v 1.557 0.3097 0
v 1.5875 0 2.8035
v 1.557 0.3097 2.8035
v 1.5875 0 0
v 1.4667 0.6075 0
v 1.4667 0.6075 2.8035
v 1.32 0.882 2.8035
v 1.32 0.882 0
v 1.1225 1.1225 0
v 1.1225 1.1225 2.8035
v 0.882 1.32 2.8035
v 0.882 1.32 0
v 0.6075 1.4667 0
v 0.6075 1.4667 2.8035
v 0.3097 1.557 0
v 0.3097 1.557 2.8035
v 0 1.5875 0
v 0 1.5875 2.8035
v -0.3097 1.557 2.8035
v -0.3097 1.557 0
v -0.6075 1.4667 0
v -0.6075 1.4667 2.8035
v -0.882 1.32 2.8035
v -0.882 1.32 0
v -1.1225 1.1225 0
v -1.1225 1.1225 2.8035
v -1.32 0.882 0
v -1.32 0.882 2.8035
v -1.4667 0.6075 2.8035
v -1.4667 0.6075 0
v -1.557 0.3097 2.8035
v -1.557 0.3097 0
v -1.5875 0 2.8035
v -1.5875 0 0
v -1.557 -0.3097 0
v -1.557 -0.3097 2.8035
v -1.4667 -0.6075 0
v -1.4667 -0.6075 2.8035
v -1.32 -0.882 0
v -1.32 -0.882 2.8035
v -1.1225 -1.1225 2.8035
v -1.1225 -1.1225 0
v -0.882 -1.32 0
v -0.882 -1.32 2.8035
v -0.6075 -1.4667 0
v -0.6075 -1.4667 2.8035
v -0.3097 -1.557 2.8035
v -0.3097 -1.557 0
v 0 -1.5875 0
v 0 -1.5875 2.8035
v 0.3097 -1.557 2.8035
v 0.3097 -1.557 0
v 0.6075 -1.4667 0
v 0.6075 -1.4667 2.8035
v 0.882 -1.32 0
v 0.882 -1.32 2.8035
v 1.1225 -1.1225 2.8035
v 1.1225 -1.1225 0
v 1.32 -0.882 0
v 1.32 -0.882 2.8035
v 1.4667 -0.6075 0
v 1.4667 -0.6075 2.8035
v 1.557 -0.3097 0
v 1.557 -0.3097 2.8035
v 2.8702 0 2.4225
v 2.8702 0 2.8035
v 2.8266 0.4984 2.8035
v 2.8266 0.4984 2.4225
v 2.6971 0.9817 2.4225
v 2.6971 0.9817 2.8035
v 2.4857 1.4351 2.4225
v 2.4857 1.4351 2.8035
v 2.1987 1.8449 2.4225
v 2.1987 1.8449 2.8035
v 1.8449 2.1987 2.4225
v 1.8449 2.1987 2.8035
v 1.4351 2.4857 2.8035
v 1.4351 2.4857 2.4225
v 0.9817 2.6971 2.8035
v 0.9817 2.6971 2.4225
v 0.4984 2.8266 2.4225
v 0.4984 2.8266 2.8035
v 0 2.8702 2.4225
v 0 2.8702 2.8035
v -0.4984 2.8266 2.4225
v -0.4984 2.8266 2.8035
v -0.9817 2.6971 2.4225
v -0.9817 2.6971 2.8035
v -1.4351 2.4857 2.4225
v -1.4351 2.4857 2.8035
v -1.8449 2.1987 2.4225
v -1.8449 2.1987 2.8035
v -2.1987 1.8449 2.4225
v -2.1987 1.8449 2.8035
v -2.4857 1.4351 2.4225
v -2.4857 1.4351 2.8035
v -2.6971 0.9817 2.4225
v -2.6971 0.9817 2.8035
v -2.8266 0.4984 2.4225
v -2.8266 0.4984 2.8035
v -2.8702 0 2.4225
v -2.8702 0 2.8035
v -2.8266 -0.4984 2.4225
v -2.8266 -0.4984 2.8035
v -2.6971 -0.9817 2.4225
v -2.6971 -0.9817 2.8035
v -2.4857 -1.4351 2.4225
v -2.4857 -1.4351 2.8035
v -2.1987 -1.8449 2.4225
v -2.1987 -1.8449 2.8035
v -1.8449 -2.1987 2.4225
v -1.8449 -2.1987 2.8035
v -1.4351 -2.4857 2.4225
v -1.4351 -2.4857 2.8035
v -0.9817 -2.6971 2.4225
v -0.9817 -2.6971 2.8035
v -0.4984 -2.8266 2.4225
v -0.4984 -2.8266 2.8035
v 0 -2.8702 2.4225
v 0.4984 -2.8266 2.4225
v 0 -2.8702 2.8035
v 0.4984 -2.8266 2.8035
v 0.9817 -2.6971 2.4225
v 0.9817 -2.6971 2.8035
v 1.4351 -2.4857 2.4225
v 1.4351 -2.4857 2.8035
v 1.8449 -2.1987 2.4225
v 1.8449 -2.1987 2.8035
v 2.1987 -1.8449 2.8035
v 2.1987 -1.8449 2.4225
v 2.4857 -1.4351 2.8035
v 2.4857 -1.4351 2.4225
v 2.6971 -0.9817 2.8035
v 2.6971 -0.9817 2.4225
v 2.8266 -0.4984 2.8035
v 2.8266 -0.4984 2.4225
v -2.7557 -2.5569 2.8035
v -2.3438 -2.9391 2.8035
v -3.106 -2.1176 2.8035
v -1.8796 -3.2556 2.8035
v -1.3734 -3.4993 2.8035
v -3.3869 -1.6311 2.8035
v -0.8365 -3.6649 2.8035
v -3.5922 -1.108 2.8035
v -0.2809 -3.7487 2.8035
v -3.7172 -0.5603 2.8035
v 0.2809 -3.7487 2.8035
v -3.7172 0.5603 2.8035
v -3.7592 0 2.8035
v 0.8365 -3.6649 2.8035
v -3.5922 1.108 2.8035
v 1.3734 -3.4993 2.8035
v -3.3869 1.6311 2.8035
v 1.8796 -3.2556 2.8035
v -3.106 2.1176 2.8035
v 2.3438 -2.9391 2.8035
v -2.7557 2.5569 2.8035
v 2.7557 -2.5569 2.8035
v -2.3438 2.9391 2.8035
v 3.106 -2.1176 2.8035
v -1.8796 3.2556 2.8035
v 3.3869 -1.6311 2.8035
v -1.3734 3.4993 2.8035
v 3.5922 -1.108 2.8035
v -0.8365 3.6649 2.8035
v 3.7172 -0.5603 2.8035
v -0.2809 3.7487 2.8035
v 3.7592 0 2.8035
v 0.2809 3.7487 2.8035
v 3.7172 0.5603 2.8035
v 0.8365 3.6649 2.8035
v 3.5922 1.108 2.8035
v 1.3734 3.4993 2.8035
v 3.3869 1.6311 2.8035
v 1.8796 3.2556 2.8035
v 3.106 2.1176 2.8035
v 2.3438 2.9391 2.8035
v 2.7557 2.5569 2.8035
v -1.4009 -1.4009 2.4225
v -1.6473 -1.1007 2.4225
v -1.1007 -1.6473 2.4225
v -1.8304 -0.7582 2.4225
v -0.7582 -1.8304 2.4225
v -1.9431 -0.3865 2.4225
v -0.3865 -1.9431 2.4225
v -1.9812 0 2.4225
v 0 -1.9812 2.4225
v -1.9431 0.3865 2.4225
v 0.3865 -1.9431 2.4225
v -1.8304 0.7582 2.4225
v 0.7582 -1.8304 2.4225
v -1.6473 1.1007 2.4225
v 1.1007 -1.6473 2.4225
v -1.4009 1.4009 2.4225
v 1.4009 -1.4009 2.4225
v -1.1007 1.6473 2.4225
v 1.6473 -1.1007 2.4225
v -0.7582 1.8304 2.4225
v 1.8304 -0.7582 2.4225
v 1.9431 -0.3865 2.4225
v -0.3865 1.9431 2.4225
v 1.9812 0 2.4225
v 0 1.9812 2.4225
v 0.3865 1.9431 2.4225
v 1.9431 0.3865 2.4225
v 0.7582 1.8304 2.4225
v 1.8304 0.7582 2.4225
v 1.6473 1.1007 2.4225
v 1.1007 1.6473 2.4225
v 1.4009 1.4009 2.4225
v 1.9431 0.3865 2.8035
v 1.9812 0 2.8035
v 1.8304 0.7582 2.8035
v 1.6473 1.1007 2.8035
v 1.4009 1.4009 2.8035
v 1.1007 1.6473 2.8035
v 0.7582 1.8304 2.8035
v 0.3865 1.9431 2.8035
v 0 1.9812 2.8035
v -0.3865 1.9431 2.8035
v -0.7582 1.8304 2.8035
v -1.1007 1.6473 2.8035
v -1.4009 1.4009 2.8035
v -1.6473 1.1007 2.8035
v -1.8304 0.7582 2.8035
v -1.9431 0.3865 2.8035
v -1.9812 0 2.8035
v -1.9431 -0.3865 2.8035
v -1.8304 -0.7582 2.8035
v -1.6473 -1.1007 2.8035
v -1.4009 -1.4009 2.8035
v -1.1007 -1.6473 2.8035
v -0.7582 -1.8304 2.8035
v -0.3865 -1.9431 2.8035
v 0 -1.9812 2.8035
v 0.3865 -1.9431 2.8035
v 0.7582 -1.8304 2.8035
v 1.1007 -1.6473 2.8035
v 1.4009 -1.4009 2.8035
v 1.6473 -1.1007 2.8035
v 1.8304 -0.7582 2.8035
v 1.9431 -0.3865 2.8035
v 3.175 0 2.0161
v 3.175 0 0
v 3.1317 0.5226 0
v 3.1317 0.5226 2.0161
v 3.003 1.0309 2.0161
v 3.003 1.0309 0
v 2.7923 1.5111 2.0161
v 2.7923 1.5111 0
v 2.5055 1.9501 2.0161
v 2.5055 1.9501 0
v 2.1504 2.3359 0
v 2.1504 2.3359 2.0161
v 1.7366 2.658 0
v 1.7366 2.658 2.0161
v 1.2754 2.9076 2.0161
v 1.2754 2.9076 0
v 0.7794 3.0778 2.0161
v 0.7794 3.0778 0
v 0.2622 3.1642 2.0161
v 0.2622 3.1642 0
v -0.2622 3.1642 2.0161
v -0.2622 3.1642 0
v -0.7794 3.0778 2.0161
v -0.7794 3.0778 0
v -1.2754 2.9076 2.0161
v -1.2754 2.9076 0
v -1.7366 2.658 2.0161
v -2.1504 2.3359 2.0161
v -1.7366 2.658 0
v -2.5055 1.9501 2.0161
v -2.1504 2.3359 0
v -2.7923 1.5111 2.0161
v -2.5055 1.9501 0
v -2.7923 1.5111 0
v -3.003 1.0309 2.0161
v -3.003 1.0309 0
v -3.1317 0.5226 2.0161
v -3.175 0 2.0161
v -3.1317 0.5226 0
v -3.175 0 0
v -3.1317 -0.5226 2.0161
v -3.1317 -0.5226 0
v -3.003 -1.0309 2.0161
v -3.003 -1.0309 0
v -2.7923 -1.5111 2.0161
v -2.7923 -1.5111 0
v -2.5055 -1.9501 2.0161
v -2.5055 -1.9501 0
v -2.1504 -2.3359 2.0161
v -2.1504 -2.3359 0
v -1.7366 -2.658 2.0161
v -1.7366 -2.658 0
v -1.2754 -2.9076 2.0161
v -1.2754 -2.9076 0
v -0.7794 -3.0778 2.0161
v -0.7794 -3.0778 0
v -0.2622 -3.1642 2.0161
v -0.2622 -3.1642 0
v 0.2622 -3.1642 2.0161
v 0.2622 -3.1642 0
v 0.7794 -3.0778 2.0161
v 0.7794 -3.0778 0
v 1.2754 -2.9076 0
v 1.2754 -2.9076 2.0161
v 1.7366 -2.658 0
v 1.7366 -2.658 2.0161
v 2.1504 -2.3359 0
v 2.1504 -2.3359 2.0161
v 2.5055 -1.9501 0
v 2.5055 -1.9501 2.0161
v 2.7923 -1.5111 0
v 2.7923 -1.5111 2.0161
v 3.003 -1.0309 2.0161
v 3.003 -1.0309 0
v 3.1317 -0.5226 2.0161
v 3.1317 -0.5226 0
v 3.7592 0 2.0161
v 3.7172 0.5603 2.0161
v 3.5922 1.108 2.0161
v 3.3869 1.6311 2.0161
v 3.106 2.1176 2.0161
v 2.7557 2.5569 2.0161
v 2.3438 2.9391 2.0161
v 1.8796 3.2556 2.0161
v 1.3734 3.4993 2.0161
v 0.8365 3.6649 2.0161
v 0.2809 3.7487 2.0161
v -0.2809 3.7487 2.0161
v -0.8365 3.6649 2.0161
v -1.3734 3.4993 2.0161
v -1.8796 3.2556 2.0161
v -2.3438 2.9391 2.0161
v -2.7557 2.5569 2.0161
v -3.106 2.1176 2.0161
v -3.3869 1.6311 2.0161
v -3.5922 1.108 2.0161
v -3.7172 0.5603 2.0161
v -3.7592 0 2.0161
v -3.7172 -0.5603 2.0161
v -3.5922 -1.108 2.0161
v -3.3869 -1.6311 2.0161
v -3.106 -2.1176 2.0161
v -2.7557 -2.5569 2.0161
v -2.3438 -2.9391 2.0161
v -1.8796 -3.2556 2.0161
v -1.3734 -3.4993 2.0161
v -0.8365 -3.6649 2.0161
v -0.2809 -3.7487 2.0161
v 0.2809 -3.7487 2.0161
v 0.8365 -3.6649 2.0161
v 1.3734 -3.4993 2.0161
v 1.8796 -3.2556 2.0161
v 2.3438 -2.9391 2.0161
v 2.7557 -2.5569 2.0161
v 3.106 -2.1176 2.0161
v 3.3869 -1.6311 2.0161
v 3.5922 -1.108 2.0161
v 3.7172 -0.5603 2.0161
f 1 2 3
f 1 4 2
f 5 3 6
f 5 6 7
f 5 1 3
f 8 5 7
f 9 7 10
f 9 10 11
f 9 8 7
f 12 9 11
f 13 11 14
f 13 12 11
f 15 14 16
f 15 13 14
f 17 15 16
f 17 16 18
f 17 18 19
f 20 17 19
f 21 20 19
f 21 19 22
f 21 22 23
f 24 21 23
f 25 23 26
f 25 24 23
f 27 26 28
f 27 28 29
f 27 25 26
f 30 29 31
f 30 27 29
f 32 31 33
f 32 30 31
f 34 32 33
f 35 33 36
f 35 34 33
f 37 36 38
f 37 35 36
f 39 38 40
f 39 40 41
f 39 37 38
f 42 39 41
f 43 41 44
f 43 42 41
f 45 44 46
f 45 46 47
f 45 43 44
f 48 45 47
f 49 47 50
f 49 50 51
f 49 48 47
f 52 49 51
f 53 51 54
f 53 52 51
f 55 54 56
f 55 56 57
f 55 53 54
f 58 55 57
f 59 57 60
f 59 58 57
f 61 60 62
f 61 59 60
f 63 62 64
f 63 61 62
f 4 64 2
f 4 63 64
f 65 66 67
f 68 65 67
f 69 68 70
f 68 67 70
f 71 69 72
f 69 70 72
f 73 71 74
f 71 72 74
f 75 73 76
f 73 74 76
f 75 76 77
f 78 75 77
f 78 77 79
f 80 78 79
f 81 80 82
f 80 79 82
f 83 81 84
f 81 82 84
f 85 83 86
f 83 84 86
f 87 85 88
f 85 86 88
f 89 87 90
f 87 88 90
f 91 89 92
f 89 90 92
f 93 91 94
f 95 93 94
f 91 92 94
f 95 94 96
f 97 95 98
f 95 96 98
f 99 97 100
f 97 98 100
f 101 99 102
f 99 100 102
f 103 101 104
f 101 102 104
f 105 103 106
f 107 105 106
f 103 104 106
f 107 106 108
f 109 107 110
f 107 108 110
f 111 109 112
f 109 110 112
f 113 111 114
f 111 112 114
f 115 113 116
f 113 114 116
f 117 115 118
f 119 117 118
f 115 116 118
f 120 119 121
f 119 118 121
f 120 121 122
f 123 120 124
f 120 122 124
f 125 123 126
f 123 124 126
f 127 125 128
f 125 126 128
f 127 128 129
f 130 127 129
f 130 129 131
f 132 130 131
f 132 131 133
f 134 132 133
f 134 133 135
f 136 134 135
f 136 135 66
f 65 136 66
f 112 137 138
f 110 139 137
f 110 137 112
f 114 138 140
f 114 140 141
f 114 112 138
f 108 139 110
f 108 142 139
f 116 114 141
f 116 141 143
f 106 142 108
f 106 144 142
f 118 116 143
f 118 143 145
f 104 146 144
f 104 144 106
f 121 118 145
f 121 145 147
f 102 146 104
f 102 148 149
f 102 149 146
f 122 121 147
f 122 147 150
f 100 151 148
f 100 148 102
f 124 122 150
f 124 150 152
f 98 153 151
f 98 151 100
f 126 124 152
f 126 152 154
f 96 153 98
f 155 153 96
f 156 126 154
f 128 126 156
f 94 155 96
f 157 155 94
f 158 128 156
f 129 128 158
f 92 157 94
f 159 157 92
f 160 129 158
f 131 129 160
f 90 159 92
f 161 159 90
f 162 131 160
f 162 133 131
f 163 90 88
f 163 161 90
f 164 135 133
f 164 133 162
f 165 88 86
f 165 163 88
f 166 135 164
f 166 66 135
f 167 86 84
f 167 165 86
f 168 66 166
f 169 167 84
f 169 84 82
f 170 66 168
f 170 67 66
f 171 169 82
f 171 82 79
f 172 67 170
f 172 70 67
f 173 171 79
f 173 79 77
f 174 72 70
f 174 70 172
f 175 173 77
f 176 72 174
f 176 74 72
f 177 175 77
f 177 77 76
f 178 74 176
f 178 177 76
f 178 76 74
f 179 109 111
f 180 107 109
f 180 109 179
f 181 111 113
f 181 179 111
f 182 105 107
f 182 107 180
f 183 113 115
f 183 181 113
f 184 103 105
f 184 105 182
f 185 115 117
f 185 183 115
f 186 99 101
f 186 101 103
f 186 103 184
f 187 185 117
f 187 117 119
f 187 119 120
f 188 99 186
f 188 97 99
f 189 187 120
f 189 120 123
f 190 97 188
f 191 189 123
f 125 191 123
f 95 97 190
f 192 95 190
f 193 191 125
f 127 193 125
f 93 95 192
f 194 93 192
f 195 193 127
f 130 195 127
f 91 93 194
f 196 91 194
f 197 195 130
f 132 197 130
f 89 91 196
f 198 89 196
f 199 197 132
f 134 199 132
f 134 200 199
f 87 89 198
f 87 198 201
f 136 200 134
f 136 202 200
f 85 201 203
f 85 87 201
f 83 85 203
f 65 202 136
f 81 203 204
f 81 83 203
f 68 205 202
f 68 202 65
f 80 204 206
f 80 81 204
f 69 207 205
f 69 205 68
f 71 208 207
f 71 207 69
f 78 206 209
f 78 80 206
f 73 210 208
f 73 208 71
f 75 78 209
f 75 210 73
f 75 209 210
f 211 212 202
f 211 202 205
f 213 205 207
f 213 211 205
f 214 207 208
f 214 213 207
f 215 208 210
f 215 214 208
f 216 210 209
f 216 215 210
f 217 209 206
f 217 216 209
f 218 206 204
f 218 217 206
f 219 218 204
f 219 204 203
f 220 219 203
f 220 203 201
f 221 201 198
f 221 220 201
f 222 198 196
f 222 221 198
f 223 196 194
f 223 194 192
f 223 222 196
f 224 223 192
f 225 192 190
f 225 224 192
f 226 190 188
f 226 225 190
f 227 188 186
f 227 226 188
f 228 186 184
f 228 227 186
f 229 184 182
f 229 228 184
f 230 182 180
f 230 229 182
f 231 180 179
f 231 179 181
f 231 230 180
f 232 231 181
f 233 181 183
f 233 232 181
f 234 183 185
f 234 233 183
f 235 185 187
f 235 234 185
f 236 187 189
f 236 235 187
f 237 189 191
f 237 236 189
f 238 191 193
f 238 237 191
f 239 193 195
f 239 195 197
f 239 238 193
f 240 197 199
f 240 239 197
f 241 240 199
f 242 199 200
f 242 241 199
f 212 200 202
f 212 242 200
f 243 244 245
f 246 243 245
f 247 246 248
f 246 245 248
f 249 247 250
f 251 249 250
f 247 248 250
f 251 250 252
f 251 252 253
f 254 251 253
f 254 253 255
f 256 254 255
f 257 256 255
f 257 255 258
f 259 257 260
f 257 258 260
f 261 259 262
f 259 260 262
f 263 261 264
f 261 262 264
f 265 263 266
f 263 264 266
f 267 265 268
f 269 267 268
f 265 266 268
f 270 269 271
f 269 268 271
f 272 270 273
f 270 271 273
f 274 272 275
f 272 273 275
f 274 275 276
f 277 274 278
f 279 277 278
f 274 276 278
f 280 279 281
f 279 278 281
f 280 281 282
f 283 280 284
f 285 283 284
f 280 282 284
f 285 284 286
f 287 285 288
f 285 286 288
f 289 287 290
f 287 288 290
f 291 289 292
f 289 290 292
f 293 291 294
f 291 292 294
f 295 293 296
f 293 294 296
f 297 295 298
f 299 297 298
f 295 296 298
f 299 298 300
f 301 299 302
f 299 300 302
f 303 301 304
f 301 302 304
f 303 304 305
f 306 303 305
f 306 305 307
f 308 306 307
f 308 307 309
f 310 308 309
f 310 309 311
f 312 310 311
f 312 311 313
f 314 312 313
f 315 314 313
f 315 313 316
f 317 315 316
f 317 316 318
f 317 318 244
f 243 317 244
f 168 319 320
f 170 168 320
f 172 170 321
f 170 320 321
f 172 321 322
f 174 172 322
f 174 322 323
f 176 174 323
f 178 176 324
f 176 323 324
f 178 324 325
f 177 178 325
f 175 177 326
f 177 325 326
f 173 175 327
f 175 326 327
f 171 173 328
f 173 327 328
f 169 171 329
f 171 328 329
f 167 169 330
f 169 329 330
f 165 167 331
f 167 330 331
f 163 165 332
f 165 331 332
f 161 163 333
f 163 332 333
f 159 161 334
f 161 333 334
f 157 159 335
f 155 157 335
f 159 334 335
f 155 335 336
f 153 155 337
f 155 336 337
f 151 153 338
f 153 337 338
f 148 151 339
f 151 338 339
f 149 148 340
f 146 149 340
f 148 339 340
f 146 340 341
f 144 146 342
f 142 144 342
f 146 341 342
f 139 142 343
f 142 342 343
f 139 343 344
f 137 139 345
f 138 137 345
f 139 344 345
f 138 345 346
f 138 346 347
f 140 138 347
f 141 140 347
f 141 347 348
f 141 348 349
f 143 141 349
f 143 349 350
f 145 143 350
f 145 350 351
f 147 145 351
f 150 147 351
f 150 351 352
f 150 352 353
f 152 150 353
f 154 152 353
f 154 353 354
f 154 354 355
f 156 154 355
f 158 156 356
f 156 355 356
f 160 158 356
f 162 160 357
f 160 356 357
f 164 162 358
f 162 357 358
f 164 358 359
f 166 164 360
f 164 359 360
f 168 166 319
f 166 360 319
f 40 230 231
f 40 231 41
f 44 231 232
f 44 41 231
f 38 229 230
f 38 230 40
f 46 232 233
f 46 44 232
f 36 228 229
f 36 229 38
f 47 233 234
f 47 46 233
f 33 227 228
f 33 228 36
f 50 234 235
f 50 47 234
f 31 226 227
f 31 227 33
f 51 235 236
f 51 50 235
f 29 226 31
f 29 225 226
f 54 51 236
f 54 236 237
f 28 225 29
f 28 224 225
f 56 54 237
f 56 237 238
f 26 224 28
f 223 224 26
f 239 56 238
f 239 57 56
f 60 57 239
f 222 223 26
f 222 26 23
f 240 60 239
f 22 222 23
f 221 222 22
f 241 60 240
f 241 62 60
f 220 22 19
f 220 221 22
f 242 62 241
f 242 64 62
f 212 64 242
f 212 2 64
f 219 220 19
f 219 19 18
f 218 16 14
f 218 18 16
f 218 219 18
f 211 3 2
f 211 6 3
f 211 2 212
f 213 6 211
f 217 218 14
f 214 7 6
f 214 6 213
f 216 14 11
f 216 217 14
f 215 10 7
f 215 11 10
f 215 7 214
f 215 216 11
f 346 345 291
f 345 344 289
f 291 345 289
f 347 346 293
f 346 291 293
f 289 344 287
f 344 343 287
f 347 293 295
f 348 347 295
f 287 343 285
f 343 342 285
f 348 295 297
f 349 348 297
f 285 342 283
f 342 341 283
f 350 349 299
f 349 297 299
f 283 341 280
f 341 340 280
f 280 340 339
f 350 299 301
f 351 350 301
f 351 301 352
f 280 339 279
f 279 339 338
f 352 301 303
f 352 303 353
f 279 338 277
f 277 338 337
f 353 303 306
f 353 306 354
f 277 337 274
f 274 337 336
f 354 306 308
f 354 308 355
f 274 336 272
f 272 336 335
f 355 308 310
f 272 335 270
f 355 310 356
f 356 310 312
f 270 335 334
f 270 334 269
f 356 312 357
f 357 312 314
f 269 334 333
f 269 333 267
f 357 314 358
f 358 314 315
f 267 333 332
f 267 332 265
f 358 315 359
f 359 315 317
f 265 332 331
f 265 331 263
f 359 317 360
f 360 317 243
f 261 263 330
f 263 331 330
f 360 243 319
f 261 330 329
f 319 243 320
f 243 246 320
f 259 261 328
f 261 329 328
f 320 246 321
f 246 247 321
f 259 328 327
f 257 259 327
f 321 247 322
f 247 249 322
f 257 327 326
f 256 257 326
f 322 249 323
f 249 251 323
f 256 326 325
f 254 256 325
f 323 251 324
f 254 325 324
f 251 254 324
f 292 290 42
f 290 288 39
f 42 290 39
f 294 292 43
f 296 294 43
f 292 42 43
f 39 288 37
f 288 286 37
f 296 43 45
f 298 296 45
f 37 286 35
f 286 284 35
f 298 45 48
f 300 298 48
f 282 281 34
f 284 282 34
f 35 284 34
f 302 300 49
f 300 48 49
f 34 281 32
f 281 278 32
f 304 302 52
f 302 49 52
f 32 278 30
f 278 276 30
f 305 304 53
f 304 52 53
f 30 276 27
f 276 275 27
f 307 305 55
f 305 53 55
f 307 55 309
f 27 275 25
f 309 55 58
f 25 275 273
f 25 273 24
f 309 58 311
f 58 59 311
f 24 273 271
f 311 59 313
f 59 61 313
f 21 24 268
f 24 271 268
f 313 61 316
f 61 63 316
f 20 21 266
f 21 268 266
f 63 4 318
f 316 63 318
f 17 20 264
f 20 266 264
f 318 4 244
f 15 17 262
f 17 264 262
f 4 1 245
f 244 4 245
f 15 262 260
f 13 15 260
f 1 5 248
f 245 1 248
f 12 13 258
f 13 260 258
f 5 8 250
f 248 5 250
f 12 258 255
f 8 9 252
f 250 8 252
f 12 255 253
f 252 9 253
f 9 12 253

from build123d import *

# Parameters (mm, degrees)
SKETCH1_R           = 3.175
SKETCH1_R_2         = 1.5875
BOSS_EXTRUDE1_DEPTH = 2.016125
SKETCH2_R           = 3.7592
SKETCH2_R_2         = 1.5875
BOSS_EXTRUDE2_DEPTH = 0.7874
SKETCH3_R           = 2.8702
SKETCH3_R_2         = 1.9812
CUT_EXTRUDE1_DEPTH  = 0.381


with BuildPart() as part:
    # Sketch1 → Boss-Extrude1 (new body)
    with BuildSketch(Plane.XY):
        Circle(SKETCH1_R)
        Circle(SKETCH1_R_2, mode=Mode.SUBTRACT)
    extrude(amount=BOSS_EXTRUDE1_DEPTH)

    # Sketch2 → Boss-Extrude2 (add)
    with BuildSketch(Plane.XY.offset(2.016125)):
        Circle(SKETCH2_R)
        Circle(SKETCH2_R_2, mode=Mode.SUBTRACT)
    extrude(amount=BOSS_EXTRUDE2_DEPTH)

    # Sketch3 → Cut-Extrude1 (cut)
    with BuildSketch(Plane.XY.offset(2.803525)):
        Circle(SKETCH3_R)
        Circle(SKETCH3_R_2, mode=Mode.SUBTRACT)
    extrude(amount=-CUT_EXTRUDE1_DEPTH, mode=Mode.SUBTRACT)


solid = part.part
